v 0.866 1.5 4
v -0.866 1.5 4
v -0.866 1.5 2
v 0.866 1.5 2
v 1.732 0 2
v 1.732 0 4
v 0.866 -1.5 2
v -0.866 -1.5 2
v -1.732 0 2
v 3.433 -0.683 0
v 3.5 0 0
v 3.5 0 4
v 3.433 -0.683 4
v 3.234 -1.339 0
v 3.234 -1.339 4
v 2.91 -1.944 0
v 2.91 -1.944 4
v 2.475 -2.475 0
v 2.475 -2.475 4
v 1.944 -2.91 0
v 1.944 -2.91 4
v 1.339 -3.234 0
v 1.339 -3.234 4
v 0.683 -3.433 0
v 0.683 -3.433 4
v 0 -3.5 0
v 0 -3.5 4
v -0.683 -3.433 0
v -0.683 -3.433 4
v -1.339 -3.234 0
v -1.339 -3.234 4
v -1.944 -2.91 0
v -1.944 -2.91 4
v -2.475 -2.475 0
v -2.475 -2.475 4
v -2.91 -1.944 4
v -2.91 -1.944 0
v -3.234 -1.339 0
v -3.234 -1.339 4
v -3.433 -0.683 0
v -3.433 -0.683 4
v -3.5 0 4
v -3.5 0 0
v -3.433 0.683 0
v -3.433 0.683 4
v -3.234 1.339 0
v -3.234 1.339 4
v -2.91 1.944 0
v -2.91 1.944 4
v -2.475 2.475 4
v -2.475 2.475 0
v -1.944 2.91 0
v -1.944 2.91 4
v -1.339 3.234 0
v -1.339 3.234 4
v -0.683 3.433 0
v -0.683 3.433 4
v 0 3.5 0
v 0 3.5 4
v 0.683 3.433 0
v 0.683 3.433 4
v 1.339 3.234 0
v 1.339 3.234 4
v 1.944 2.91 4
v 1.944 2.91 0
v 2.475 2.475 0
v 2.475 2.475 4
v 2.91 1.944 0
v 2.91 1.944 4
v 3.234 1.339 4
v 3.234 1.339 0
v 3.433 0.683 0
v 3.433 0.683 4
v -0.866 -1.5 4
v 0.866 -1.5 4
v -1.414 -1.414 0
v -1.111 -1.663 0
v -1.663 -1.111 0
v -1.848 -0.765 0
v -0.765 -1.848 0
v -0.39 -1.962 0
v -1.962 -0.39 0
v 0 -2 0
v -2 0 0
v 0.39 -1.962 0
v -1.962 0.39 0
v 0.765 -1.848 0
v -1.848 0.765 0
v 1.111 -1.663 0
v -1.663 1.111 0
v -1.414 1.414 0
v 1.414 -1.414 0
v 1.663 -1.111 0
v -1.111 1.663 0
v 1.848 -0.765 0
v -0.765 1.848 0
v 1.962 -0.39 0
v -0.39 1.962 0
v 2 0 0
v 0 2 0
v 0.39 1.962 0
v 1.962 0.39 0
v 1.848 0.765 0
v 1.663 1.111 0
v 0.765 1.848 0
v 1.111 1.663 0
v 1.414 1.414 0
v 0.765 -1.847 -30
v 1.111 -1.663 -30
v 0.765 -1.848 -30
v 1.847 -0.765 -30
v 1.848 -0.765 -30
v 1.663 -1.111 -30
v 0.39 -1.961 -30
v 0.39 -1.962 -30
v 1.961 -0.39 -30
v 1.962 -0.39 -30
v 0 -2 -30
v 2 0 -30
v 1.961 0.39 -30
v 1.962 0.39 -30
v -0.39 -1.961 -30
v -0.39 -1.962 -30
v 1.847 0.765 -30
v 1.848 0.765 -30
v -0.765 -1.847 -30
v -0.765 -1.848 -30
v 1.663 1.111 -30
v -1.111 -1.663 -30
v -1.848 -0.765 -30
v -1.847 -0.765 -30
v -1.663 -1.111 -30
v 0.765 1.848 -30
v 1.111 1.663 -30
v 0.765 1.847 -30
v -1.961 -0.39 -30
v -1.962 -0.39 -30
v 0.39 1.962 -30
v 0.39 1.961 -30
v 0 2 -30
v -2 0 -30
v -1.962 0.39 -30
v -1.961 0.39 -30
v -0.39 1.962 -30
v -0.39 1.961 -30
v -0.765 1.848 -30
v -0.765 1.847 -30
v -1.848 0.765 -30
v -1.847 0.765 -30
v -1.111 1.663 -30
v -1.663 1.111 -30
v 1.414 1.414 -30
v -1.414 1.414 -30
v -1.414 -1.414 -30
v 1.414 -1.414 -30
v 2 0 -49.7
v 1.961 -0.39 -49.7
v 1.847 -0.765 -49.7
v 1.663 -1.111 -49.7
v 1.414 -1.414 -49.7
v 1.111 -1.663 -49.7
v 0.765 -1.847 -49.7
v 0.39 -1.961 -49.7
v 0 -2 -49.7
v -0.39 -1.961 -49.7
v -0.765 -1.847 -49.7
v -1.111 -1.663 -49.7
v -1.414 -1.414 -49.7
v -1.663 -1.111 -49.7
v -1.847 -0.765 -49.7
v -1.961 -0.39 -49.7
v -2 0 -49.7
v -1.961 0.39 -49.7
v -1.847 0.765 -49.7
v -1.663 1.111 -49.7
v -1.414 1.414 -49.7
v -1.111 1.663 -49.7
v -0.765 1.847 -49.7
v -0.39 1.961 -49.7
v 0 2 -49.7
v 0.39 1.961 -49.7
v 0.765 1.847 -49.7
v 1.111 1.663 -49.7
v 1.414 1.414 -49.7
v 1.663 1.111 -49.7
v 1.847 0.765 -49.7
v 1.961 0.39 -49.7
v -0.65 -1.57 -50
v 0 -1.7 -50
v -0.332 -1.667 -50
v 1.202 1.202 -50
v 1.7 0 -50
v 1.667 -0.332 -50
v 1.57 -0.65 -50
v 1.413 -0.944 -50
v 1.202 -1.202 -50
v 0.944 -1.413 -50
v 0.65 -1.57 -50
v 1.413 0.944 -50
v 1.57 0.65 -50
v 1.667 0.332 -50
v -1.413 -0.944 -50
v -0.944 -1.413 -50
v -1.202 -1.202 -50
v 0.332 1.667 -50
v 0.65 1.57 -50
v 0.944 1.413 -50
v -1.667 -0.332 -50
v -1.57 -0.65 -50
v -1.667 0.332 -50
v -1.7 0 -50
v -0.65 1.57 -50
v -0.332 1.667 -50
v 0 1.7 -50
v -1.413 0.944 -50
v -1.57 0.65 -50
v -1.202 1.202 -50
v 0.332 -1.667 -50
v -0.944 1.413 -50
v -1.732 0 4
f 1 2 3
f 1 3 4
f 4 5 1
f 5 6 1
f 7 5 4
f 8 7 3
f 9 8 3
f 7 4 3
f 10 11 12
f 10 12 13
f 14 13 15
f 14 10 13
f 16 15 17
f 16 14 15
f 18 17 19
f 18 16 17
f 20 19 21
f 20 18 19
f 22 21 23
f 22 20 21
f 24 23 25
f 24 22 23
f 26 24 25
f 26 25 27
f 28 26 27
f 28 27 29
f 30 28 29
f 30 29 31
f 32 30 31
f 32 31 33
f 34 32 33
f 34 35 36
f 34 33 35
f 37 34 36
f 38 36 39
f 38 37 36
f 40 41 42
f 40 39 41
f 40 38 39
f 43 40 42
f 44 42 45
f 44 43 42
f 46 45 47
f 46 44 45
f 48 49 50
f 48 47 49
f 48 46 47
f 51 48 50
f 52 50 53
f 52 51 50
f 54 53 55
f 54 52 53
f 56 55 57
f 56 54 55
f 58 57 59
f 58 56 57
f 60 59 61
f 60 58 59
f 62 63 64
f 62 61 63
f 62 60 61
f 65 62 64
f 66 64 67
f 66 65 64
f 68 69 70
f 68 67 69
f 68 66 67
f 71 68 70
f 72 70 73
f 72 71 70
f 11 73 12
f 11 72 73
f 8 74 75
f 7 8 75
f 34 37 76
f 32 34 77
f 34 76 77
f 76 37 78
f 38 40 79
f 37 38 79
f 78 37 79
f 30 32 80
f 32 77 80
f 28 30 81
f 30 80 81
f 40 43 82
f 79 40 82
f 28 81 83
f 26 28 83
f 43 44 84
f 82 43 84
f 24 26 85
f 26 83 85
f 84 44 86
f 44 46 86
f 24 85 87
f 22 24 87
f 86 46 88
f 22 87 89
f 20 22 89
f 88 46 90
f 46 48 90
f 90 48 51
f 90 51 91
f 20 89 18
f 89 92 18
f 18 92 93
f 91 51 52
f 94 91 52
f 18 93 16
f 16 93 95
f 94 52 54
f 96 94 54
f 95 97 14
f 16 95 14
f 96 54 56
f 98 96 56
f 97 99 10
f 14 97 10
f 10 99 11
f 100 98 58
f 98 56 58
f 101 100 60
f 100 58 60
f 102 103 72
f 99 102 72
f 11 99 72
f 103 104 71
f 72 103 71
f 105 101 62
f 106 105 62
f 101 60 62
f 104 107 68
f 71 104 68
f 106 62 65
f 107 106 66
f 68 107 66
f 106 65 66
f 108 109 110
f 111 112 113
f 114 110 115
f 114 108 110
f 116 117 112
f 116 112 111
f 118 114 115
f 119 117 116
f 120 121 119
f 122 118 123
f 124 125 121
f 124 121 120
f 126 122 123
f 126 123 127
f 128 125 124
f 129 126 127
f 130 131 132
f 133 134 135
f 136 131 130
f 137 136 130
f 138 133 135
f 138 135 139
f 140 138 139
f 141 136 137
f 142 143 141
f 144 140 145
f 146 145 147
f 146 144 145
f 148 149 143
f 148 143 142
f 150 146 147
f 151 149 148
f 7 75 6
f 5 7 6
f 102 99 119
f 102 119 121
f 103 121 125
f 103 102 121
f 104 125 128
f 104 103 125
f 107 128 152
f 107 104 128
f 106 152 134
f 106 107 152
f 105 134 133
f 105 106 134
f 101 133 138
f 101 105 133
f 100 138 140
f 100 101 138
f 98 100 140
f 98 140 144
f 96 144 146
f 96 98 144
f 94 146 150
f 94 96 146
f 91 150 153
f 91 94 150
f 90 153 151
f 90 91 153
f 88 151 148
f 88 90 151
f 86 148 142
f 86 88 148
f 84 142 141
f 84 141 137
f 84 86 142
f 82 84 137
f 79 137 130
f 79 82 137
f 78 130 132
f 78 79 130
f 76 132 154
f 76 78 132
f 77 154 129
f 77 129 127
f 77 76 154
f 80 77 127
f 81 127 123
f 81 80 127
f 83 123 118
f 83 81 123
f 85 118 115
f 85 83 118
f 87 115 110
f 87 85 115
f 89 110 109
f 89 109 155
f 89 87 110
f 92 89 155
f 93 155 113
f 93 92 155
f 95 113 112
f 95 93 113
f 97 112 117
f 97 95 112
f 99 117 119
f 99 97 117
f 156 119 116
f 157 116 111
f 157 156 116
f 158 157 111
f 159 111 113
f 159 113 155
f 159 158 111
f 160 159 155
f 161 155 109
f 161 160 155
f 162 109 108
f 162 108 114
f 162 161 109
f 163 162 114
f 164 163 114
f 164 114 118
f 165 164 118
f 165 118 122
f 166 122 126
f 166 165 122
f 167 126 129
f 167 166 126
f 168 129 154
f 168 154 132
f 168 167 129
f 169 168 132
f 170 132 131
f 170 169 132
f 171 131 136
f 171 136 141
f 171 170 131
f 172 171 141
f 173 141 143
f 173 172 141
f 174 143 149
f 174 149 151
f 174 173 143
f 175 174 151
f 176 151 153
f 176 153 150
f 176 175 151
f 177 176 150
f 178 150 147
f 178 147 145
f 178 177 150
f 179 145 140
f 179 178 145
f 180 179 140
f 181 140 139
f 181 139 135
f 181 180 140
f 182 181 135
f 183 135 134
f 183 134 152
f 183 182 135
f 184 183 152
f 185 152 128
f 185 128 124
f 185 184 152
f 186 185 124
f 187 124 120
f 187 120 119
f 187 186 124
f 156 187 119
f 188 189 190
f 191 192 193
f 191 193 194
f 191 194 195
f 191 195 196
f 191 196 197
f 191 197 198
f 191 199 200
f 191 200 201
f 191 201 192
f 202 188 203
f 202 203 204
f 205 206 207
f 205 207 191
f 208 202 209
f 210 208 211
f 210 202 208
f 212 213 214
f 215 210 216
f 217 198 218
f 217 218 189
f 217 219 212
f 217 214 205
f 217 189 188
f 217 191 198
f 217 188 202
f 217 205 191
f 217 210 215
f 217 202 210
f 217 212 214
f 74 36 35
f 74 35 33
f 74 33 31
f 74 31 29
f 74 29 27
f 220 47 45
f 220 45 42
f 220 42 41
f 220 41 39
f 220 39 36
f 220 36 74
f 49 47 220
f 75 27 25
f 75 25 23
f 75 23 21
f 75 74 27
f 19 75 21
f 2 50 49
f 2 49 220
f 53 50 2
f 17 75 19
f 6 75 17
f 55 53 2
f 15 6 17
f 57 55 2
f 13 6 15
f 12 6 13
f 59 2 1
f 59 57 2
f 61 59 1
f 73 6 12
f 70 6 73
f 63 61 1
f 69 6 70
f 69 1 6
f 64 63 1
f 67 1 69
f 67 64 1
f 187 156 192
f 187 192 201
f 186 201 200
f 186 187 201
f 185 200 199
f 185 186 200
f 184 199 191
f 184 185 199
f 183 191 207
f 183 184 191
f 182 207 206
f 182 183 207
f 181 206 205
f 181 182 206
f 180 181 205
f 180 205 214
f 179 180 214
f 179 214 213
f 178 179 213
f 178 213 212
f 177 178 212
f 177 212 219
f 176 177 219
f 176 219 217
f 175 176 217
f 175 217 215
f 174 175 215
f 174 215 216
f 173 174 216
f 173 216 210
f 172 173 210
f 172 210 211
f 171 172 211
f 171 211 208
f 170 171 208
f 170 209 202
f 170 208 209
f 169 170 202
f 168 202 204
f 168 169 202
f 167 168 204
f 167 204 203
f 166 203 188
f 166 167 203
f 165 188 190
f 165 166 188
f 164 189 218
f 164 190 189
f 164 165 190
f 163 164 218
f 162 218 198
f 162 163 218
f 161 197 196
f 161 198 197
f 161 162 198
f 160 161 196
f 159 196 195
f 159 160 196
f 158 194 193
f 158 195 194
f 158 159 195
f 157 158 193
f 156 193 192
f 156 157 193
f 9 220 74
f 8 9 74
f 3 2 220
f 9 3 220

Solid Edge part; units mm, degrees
sketch "Sketch1" plane through (0, 0, 0) normal (0, 0, 1) x (1, 0, 0)
  circle A0 centre (0, 0) radius 3.5
  dimension "D1" = 7
extrude "Protrusion1" add sketch "Sketch1" along normal blind 4
sketch "Sketch2" plane through (0, 0, 0) normal (0, 0, -1) x (1, 0, 0)
  circle A0 centre (0, 0) radius 2
extrude "Protrusion2" add sketch "Sketch2" along normal blind 50
sketch "Sketch3" plane through (0, 0, -50) normal (0, 0, -1) x (1, 0, 0)
  circle A0 centre (0, 0) radius 1.9997
extrude "Cutout1" cut sketch "Sketch3" against normal blind 20 flip side to cut
chamfer "Chamfer_1" distance 0.3 angle 45 1 edges at (-1.9997, 0, -50)
sketch "Sketch4" plane through (0, 0, 4) normal (0, 0, 1) x (1, 0, 0)
  line L0 (-0.866, 1.5) -> (0.866, 1.5)
  line L1 (1.7321, 0) -> (0.866, 1.5)
  line L2 (0.866, -1.5) -> (1.7321, 0)
  line L3 (-0.866, -1.5) -> (0.866, -1.5)
  line L4 (-1.7321, 0) -> (-0.866, -1.5)
  line L5 (-0.866, 1.5) -> (-1.7321, 0)
  dimension "D1" = 3
extrude "Cutout2" cut sketch "Sketch4" against normal blind 2
properties part number "24101455"
